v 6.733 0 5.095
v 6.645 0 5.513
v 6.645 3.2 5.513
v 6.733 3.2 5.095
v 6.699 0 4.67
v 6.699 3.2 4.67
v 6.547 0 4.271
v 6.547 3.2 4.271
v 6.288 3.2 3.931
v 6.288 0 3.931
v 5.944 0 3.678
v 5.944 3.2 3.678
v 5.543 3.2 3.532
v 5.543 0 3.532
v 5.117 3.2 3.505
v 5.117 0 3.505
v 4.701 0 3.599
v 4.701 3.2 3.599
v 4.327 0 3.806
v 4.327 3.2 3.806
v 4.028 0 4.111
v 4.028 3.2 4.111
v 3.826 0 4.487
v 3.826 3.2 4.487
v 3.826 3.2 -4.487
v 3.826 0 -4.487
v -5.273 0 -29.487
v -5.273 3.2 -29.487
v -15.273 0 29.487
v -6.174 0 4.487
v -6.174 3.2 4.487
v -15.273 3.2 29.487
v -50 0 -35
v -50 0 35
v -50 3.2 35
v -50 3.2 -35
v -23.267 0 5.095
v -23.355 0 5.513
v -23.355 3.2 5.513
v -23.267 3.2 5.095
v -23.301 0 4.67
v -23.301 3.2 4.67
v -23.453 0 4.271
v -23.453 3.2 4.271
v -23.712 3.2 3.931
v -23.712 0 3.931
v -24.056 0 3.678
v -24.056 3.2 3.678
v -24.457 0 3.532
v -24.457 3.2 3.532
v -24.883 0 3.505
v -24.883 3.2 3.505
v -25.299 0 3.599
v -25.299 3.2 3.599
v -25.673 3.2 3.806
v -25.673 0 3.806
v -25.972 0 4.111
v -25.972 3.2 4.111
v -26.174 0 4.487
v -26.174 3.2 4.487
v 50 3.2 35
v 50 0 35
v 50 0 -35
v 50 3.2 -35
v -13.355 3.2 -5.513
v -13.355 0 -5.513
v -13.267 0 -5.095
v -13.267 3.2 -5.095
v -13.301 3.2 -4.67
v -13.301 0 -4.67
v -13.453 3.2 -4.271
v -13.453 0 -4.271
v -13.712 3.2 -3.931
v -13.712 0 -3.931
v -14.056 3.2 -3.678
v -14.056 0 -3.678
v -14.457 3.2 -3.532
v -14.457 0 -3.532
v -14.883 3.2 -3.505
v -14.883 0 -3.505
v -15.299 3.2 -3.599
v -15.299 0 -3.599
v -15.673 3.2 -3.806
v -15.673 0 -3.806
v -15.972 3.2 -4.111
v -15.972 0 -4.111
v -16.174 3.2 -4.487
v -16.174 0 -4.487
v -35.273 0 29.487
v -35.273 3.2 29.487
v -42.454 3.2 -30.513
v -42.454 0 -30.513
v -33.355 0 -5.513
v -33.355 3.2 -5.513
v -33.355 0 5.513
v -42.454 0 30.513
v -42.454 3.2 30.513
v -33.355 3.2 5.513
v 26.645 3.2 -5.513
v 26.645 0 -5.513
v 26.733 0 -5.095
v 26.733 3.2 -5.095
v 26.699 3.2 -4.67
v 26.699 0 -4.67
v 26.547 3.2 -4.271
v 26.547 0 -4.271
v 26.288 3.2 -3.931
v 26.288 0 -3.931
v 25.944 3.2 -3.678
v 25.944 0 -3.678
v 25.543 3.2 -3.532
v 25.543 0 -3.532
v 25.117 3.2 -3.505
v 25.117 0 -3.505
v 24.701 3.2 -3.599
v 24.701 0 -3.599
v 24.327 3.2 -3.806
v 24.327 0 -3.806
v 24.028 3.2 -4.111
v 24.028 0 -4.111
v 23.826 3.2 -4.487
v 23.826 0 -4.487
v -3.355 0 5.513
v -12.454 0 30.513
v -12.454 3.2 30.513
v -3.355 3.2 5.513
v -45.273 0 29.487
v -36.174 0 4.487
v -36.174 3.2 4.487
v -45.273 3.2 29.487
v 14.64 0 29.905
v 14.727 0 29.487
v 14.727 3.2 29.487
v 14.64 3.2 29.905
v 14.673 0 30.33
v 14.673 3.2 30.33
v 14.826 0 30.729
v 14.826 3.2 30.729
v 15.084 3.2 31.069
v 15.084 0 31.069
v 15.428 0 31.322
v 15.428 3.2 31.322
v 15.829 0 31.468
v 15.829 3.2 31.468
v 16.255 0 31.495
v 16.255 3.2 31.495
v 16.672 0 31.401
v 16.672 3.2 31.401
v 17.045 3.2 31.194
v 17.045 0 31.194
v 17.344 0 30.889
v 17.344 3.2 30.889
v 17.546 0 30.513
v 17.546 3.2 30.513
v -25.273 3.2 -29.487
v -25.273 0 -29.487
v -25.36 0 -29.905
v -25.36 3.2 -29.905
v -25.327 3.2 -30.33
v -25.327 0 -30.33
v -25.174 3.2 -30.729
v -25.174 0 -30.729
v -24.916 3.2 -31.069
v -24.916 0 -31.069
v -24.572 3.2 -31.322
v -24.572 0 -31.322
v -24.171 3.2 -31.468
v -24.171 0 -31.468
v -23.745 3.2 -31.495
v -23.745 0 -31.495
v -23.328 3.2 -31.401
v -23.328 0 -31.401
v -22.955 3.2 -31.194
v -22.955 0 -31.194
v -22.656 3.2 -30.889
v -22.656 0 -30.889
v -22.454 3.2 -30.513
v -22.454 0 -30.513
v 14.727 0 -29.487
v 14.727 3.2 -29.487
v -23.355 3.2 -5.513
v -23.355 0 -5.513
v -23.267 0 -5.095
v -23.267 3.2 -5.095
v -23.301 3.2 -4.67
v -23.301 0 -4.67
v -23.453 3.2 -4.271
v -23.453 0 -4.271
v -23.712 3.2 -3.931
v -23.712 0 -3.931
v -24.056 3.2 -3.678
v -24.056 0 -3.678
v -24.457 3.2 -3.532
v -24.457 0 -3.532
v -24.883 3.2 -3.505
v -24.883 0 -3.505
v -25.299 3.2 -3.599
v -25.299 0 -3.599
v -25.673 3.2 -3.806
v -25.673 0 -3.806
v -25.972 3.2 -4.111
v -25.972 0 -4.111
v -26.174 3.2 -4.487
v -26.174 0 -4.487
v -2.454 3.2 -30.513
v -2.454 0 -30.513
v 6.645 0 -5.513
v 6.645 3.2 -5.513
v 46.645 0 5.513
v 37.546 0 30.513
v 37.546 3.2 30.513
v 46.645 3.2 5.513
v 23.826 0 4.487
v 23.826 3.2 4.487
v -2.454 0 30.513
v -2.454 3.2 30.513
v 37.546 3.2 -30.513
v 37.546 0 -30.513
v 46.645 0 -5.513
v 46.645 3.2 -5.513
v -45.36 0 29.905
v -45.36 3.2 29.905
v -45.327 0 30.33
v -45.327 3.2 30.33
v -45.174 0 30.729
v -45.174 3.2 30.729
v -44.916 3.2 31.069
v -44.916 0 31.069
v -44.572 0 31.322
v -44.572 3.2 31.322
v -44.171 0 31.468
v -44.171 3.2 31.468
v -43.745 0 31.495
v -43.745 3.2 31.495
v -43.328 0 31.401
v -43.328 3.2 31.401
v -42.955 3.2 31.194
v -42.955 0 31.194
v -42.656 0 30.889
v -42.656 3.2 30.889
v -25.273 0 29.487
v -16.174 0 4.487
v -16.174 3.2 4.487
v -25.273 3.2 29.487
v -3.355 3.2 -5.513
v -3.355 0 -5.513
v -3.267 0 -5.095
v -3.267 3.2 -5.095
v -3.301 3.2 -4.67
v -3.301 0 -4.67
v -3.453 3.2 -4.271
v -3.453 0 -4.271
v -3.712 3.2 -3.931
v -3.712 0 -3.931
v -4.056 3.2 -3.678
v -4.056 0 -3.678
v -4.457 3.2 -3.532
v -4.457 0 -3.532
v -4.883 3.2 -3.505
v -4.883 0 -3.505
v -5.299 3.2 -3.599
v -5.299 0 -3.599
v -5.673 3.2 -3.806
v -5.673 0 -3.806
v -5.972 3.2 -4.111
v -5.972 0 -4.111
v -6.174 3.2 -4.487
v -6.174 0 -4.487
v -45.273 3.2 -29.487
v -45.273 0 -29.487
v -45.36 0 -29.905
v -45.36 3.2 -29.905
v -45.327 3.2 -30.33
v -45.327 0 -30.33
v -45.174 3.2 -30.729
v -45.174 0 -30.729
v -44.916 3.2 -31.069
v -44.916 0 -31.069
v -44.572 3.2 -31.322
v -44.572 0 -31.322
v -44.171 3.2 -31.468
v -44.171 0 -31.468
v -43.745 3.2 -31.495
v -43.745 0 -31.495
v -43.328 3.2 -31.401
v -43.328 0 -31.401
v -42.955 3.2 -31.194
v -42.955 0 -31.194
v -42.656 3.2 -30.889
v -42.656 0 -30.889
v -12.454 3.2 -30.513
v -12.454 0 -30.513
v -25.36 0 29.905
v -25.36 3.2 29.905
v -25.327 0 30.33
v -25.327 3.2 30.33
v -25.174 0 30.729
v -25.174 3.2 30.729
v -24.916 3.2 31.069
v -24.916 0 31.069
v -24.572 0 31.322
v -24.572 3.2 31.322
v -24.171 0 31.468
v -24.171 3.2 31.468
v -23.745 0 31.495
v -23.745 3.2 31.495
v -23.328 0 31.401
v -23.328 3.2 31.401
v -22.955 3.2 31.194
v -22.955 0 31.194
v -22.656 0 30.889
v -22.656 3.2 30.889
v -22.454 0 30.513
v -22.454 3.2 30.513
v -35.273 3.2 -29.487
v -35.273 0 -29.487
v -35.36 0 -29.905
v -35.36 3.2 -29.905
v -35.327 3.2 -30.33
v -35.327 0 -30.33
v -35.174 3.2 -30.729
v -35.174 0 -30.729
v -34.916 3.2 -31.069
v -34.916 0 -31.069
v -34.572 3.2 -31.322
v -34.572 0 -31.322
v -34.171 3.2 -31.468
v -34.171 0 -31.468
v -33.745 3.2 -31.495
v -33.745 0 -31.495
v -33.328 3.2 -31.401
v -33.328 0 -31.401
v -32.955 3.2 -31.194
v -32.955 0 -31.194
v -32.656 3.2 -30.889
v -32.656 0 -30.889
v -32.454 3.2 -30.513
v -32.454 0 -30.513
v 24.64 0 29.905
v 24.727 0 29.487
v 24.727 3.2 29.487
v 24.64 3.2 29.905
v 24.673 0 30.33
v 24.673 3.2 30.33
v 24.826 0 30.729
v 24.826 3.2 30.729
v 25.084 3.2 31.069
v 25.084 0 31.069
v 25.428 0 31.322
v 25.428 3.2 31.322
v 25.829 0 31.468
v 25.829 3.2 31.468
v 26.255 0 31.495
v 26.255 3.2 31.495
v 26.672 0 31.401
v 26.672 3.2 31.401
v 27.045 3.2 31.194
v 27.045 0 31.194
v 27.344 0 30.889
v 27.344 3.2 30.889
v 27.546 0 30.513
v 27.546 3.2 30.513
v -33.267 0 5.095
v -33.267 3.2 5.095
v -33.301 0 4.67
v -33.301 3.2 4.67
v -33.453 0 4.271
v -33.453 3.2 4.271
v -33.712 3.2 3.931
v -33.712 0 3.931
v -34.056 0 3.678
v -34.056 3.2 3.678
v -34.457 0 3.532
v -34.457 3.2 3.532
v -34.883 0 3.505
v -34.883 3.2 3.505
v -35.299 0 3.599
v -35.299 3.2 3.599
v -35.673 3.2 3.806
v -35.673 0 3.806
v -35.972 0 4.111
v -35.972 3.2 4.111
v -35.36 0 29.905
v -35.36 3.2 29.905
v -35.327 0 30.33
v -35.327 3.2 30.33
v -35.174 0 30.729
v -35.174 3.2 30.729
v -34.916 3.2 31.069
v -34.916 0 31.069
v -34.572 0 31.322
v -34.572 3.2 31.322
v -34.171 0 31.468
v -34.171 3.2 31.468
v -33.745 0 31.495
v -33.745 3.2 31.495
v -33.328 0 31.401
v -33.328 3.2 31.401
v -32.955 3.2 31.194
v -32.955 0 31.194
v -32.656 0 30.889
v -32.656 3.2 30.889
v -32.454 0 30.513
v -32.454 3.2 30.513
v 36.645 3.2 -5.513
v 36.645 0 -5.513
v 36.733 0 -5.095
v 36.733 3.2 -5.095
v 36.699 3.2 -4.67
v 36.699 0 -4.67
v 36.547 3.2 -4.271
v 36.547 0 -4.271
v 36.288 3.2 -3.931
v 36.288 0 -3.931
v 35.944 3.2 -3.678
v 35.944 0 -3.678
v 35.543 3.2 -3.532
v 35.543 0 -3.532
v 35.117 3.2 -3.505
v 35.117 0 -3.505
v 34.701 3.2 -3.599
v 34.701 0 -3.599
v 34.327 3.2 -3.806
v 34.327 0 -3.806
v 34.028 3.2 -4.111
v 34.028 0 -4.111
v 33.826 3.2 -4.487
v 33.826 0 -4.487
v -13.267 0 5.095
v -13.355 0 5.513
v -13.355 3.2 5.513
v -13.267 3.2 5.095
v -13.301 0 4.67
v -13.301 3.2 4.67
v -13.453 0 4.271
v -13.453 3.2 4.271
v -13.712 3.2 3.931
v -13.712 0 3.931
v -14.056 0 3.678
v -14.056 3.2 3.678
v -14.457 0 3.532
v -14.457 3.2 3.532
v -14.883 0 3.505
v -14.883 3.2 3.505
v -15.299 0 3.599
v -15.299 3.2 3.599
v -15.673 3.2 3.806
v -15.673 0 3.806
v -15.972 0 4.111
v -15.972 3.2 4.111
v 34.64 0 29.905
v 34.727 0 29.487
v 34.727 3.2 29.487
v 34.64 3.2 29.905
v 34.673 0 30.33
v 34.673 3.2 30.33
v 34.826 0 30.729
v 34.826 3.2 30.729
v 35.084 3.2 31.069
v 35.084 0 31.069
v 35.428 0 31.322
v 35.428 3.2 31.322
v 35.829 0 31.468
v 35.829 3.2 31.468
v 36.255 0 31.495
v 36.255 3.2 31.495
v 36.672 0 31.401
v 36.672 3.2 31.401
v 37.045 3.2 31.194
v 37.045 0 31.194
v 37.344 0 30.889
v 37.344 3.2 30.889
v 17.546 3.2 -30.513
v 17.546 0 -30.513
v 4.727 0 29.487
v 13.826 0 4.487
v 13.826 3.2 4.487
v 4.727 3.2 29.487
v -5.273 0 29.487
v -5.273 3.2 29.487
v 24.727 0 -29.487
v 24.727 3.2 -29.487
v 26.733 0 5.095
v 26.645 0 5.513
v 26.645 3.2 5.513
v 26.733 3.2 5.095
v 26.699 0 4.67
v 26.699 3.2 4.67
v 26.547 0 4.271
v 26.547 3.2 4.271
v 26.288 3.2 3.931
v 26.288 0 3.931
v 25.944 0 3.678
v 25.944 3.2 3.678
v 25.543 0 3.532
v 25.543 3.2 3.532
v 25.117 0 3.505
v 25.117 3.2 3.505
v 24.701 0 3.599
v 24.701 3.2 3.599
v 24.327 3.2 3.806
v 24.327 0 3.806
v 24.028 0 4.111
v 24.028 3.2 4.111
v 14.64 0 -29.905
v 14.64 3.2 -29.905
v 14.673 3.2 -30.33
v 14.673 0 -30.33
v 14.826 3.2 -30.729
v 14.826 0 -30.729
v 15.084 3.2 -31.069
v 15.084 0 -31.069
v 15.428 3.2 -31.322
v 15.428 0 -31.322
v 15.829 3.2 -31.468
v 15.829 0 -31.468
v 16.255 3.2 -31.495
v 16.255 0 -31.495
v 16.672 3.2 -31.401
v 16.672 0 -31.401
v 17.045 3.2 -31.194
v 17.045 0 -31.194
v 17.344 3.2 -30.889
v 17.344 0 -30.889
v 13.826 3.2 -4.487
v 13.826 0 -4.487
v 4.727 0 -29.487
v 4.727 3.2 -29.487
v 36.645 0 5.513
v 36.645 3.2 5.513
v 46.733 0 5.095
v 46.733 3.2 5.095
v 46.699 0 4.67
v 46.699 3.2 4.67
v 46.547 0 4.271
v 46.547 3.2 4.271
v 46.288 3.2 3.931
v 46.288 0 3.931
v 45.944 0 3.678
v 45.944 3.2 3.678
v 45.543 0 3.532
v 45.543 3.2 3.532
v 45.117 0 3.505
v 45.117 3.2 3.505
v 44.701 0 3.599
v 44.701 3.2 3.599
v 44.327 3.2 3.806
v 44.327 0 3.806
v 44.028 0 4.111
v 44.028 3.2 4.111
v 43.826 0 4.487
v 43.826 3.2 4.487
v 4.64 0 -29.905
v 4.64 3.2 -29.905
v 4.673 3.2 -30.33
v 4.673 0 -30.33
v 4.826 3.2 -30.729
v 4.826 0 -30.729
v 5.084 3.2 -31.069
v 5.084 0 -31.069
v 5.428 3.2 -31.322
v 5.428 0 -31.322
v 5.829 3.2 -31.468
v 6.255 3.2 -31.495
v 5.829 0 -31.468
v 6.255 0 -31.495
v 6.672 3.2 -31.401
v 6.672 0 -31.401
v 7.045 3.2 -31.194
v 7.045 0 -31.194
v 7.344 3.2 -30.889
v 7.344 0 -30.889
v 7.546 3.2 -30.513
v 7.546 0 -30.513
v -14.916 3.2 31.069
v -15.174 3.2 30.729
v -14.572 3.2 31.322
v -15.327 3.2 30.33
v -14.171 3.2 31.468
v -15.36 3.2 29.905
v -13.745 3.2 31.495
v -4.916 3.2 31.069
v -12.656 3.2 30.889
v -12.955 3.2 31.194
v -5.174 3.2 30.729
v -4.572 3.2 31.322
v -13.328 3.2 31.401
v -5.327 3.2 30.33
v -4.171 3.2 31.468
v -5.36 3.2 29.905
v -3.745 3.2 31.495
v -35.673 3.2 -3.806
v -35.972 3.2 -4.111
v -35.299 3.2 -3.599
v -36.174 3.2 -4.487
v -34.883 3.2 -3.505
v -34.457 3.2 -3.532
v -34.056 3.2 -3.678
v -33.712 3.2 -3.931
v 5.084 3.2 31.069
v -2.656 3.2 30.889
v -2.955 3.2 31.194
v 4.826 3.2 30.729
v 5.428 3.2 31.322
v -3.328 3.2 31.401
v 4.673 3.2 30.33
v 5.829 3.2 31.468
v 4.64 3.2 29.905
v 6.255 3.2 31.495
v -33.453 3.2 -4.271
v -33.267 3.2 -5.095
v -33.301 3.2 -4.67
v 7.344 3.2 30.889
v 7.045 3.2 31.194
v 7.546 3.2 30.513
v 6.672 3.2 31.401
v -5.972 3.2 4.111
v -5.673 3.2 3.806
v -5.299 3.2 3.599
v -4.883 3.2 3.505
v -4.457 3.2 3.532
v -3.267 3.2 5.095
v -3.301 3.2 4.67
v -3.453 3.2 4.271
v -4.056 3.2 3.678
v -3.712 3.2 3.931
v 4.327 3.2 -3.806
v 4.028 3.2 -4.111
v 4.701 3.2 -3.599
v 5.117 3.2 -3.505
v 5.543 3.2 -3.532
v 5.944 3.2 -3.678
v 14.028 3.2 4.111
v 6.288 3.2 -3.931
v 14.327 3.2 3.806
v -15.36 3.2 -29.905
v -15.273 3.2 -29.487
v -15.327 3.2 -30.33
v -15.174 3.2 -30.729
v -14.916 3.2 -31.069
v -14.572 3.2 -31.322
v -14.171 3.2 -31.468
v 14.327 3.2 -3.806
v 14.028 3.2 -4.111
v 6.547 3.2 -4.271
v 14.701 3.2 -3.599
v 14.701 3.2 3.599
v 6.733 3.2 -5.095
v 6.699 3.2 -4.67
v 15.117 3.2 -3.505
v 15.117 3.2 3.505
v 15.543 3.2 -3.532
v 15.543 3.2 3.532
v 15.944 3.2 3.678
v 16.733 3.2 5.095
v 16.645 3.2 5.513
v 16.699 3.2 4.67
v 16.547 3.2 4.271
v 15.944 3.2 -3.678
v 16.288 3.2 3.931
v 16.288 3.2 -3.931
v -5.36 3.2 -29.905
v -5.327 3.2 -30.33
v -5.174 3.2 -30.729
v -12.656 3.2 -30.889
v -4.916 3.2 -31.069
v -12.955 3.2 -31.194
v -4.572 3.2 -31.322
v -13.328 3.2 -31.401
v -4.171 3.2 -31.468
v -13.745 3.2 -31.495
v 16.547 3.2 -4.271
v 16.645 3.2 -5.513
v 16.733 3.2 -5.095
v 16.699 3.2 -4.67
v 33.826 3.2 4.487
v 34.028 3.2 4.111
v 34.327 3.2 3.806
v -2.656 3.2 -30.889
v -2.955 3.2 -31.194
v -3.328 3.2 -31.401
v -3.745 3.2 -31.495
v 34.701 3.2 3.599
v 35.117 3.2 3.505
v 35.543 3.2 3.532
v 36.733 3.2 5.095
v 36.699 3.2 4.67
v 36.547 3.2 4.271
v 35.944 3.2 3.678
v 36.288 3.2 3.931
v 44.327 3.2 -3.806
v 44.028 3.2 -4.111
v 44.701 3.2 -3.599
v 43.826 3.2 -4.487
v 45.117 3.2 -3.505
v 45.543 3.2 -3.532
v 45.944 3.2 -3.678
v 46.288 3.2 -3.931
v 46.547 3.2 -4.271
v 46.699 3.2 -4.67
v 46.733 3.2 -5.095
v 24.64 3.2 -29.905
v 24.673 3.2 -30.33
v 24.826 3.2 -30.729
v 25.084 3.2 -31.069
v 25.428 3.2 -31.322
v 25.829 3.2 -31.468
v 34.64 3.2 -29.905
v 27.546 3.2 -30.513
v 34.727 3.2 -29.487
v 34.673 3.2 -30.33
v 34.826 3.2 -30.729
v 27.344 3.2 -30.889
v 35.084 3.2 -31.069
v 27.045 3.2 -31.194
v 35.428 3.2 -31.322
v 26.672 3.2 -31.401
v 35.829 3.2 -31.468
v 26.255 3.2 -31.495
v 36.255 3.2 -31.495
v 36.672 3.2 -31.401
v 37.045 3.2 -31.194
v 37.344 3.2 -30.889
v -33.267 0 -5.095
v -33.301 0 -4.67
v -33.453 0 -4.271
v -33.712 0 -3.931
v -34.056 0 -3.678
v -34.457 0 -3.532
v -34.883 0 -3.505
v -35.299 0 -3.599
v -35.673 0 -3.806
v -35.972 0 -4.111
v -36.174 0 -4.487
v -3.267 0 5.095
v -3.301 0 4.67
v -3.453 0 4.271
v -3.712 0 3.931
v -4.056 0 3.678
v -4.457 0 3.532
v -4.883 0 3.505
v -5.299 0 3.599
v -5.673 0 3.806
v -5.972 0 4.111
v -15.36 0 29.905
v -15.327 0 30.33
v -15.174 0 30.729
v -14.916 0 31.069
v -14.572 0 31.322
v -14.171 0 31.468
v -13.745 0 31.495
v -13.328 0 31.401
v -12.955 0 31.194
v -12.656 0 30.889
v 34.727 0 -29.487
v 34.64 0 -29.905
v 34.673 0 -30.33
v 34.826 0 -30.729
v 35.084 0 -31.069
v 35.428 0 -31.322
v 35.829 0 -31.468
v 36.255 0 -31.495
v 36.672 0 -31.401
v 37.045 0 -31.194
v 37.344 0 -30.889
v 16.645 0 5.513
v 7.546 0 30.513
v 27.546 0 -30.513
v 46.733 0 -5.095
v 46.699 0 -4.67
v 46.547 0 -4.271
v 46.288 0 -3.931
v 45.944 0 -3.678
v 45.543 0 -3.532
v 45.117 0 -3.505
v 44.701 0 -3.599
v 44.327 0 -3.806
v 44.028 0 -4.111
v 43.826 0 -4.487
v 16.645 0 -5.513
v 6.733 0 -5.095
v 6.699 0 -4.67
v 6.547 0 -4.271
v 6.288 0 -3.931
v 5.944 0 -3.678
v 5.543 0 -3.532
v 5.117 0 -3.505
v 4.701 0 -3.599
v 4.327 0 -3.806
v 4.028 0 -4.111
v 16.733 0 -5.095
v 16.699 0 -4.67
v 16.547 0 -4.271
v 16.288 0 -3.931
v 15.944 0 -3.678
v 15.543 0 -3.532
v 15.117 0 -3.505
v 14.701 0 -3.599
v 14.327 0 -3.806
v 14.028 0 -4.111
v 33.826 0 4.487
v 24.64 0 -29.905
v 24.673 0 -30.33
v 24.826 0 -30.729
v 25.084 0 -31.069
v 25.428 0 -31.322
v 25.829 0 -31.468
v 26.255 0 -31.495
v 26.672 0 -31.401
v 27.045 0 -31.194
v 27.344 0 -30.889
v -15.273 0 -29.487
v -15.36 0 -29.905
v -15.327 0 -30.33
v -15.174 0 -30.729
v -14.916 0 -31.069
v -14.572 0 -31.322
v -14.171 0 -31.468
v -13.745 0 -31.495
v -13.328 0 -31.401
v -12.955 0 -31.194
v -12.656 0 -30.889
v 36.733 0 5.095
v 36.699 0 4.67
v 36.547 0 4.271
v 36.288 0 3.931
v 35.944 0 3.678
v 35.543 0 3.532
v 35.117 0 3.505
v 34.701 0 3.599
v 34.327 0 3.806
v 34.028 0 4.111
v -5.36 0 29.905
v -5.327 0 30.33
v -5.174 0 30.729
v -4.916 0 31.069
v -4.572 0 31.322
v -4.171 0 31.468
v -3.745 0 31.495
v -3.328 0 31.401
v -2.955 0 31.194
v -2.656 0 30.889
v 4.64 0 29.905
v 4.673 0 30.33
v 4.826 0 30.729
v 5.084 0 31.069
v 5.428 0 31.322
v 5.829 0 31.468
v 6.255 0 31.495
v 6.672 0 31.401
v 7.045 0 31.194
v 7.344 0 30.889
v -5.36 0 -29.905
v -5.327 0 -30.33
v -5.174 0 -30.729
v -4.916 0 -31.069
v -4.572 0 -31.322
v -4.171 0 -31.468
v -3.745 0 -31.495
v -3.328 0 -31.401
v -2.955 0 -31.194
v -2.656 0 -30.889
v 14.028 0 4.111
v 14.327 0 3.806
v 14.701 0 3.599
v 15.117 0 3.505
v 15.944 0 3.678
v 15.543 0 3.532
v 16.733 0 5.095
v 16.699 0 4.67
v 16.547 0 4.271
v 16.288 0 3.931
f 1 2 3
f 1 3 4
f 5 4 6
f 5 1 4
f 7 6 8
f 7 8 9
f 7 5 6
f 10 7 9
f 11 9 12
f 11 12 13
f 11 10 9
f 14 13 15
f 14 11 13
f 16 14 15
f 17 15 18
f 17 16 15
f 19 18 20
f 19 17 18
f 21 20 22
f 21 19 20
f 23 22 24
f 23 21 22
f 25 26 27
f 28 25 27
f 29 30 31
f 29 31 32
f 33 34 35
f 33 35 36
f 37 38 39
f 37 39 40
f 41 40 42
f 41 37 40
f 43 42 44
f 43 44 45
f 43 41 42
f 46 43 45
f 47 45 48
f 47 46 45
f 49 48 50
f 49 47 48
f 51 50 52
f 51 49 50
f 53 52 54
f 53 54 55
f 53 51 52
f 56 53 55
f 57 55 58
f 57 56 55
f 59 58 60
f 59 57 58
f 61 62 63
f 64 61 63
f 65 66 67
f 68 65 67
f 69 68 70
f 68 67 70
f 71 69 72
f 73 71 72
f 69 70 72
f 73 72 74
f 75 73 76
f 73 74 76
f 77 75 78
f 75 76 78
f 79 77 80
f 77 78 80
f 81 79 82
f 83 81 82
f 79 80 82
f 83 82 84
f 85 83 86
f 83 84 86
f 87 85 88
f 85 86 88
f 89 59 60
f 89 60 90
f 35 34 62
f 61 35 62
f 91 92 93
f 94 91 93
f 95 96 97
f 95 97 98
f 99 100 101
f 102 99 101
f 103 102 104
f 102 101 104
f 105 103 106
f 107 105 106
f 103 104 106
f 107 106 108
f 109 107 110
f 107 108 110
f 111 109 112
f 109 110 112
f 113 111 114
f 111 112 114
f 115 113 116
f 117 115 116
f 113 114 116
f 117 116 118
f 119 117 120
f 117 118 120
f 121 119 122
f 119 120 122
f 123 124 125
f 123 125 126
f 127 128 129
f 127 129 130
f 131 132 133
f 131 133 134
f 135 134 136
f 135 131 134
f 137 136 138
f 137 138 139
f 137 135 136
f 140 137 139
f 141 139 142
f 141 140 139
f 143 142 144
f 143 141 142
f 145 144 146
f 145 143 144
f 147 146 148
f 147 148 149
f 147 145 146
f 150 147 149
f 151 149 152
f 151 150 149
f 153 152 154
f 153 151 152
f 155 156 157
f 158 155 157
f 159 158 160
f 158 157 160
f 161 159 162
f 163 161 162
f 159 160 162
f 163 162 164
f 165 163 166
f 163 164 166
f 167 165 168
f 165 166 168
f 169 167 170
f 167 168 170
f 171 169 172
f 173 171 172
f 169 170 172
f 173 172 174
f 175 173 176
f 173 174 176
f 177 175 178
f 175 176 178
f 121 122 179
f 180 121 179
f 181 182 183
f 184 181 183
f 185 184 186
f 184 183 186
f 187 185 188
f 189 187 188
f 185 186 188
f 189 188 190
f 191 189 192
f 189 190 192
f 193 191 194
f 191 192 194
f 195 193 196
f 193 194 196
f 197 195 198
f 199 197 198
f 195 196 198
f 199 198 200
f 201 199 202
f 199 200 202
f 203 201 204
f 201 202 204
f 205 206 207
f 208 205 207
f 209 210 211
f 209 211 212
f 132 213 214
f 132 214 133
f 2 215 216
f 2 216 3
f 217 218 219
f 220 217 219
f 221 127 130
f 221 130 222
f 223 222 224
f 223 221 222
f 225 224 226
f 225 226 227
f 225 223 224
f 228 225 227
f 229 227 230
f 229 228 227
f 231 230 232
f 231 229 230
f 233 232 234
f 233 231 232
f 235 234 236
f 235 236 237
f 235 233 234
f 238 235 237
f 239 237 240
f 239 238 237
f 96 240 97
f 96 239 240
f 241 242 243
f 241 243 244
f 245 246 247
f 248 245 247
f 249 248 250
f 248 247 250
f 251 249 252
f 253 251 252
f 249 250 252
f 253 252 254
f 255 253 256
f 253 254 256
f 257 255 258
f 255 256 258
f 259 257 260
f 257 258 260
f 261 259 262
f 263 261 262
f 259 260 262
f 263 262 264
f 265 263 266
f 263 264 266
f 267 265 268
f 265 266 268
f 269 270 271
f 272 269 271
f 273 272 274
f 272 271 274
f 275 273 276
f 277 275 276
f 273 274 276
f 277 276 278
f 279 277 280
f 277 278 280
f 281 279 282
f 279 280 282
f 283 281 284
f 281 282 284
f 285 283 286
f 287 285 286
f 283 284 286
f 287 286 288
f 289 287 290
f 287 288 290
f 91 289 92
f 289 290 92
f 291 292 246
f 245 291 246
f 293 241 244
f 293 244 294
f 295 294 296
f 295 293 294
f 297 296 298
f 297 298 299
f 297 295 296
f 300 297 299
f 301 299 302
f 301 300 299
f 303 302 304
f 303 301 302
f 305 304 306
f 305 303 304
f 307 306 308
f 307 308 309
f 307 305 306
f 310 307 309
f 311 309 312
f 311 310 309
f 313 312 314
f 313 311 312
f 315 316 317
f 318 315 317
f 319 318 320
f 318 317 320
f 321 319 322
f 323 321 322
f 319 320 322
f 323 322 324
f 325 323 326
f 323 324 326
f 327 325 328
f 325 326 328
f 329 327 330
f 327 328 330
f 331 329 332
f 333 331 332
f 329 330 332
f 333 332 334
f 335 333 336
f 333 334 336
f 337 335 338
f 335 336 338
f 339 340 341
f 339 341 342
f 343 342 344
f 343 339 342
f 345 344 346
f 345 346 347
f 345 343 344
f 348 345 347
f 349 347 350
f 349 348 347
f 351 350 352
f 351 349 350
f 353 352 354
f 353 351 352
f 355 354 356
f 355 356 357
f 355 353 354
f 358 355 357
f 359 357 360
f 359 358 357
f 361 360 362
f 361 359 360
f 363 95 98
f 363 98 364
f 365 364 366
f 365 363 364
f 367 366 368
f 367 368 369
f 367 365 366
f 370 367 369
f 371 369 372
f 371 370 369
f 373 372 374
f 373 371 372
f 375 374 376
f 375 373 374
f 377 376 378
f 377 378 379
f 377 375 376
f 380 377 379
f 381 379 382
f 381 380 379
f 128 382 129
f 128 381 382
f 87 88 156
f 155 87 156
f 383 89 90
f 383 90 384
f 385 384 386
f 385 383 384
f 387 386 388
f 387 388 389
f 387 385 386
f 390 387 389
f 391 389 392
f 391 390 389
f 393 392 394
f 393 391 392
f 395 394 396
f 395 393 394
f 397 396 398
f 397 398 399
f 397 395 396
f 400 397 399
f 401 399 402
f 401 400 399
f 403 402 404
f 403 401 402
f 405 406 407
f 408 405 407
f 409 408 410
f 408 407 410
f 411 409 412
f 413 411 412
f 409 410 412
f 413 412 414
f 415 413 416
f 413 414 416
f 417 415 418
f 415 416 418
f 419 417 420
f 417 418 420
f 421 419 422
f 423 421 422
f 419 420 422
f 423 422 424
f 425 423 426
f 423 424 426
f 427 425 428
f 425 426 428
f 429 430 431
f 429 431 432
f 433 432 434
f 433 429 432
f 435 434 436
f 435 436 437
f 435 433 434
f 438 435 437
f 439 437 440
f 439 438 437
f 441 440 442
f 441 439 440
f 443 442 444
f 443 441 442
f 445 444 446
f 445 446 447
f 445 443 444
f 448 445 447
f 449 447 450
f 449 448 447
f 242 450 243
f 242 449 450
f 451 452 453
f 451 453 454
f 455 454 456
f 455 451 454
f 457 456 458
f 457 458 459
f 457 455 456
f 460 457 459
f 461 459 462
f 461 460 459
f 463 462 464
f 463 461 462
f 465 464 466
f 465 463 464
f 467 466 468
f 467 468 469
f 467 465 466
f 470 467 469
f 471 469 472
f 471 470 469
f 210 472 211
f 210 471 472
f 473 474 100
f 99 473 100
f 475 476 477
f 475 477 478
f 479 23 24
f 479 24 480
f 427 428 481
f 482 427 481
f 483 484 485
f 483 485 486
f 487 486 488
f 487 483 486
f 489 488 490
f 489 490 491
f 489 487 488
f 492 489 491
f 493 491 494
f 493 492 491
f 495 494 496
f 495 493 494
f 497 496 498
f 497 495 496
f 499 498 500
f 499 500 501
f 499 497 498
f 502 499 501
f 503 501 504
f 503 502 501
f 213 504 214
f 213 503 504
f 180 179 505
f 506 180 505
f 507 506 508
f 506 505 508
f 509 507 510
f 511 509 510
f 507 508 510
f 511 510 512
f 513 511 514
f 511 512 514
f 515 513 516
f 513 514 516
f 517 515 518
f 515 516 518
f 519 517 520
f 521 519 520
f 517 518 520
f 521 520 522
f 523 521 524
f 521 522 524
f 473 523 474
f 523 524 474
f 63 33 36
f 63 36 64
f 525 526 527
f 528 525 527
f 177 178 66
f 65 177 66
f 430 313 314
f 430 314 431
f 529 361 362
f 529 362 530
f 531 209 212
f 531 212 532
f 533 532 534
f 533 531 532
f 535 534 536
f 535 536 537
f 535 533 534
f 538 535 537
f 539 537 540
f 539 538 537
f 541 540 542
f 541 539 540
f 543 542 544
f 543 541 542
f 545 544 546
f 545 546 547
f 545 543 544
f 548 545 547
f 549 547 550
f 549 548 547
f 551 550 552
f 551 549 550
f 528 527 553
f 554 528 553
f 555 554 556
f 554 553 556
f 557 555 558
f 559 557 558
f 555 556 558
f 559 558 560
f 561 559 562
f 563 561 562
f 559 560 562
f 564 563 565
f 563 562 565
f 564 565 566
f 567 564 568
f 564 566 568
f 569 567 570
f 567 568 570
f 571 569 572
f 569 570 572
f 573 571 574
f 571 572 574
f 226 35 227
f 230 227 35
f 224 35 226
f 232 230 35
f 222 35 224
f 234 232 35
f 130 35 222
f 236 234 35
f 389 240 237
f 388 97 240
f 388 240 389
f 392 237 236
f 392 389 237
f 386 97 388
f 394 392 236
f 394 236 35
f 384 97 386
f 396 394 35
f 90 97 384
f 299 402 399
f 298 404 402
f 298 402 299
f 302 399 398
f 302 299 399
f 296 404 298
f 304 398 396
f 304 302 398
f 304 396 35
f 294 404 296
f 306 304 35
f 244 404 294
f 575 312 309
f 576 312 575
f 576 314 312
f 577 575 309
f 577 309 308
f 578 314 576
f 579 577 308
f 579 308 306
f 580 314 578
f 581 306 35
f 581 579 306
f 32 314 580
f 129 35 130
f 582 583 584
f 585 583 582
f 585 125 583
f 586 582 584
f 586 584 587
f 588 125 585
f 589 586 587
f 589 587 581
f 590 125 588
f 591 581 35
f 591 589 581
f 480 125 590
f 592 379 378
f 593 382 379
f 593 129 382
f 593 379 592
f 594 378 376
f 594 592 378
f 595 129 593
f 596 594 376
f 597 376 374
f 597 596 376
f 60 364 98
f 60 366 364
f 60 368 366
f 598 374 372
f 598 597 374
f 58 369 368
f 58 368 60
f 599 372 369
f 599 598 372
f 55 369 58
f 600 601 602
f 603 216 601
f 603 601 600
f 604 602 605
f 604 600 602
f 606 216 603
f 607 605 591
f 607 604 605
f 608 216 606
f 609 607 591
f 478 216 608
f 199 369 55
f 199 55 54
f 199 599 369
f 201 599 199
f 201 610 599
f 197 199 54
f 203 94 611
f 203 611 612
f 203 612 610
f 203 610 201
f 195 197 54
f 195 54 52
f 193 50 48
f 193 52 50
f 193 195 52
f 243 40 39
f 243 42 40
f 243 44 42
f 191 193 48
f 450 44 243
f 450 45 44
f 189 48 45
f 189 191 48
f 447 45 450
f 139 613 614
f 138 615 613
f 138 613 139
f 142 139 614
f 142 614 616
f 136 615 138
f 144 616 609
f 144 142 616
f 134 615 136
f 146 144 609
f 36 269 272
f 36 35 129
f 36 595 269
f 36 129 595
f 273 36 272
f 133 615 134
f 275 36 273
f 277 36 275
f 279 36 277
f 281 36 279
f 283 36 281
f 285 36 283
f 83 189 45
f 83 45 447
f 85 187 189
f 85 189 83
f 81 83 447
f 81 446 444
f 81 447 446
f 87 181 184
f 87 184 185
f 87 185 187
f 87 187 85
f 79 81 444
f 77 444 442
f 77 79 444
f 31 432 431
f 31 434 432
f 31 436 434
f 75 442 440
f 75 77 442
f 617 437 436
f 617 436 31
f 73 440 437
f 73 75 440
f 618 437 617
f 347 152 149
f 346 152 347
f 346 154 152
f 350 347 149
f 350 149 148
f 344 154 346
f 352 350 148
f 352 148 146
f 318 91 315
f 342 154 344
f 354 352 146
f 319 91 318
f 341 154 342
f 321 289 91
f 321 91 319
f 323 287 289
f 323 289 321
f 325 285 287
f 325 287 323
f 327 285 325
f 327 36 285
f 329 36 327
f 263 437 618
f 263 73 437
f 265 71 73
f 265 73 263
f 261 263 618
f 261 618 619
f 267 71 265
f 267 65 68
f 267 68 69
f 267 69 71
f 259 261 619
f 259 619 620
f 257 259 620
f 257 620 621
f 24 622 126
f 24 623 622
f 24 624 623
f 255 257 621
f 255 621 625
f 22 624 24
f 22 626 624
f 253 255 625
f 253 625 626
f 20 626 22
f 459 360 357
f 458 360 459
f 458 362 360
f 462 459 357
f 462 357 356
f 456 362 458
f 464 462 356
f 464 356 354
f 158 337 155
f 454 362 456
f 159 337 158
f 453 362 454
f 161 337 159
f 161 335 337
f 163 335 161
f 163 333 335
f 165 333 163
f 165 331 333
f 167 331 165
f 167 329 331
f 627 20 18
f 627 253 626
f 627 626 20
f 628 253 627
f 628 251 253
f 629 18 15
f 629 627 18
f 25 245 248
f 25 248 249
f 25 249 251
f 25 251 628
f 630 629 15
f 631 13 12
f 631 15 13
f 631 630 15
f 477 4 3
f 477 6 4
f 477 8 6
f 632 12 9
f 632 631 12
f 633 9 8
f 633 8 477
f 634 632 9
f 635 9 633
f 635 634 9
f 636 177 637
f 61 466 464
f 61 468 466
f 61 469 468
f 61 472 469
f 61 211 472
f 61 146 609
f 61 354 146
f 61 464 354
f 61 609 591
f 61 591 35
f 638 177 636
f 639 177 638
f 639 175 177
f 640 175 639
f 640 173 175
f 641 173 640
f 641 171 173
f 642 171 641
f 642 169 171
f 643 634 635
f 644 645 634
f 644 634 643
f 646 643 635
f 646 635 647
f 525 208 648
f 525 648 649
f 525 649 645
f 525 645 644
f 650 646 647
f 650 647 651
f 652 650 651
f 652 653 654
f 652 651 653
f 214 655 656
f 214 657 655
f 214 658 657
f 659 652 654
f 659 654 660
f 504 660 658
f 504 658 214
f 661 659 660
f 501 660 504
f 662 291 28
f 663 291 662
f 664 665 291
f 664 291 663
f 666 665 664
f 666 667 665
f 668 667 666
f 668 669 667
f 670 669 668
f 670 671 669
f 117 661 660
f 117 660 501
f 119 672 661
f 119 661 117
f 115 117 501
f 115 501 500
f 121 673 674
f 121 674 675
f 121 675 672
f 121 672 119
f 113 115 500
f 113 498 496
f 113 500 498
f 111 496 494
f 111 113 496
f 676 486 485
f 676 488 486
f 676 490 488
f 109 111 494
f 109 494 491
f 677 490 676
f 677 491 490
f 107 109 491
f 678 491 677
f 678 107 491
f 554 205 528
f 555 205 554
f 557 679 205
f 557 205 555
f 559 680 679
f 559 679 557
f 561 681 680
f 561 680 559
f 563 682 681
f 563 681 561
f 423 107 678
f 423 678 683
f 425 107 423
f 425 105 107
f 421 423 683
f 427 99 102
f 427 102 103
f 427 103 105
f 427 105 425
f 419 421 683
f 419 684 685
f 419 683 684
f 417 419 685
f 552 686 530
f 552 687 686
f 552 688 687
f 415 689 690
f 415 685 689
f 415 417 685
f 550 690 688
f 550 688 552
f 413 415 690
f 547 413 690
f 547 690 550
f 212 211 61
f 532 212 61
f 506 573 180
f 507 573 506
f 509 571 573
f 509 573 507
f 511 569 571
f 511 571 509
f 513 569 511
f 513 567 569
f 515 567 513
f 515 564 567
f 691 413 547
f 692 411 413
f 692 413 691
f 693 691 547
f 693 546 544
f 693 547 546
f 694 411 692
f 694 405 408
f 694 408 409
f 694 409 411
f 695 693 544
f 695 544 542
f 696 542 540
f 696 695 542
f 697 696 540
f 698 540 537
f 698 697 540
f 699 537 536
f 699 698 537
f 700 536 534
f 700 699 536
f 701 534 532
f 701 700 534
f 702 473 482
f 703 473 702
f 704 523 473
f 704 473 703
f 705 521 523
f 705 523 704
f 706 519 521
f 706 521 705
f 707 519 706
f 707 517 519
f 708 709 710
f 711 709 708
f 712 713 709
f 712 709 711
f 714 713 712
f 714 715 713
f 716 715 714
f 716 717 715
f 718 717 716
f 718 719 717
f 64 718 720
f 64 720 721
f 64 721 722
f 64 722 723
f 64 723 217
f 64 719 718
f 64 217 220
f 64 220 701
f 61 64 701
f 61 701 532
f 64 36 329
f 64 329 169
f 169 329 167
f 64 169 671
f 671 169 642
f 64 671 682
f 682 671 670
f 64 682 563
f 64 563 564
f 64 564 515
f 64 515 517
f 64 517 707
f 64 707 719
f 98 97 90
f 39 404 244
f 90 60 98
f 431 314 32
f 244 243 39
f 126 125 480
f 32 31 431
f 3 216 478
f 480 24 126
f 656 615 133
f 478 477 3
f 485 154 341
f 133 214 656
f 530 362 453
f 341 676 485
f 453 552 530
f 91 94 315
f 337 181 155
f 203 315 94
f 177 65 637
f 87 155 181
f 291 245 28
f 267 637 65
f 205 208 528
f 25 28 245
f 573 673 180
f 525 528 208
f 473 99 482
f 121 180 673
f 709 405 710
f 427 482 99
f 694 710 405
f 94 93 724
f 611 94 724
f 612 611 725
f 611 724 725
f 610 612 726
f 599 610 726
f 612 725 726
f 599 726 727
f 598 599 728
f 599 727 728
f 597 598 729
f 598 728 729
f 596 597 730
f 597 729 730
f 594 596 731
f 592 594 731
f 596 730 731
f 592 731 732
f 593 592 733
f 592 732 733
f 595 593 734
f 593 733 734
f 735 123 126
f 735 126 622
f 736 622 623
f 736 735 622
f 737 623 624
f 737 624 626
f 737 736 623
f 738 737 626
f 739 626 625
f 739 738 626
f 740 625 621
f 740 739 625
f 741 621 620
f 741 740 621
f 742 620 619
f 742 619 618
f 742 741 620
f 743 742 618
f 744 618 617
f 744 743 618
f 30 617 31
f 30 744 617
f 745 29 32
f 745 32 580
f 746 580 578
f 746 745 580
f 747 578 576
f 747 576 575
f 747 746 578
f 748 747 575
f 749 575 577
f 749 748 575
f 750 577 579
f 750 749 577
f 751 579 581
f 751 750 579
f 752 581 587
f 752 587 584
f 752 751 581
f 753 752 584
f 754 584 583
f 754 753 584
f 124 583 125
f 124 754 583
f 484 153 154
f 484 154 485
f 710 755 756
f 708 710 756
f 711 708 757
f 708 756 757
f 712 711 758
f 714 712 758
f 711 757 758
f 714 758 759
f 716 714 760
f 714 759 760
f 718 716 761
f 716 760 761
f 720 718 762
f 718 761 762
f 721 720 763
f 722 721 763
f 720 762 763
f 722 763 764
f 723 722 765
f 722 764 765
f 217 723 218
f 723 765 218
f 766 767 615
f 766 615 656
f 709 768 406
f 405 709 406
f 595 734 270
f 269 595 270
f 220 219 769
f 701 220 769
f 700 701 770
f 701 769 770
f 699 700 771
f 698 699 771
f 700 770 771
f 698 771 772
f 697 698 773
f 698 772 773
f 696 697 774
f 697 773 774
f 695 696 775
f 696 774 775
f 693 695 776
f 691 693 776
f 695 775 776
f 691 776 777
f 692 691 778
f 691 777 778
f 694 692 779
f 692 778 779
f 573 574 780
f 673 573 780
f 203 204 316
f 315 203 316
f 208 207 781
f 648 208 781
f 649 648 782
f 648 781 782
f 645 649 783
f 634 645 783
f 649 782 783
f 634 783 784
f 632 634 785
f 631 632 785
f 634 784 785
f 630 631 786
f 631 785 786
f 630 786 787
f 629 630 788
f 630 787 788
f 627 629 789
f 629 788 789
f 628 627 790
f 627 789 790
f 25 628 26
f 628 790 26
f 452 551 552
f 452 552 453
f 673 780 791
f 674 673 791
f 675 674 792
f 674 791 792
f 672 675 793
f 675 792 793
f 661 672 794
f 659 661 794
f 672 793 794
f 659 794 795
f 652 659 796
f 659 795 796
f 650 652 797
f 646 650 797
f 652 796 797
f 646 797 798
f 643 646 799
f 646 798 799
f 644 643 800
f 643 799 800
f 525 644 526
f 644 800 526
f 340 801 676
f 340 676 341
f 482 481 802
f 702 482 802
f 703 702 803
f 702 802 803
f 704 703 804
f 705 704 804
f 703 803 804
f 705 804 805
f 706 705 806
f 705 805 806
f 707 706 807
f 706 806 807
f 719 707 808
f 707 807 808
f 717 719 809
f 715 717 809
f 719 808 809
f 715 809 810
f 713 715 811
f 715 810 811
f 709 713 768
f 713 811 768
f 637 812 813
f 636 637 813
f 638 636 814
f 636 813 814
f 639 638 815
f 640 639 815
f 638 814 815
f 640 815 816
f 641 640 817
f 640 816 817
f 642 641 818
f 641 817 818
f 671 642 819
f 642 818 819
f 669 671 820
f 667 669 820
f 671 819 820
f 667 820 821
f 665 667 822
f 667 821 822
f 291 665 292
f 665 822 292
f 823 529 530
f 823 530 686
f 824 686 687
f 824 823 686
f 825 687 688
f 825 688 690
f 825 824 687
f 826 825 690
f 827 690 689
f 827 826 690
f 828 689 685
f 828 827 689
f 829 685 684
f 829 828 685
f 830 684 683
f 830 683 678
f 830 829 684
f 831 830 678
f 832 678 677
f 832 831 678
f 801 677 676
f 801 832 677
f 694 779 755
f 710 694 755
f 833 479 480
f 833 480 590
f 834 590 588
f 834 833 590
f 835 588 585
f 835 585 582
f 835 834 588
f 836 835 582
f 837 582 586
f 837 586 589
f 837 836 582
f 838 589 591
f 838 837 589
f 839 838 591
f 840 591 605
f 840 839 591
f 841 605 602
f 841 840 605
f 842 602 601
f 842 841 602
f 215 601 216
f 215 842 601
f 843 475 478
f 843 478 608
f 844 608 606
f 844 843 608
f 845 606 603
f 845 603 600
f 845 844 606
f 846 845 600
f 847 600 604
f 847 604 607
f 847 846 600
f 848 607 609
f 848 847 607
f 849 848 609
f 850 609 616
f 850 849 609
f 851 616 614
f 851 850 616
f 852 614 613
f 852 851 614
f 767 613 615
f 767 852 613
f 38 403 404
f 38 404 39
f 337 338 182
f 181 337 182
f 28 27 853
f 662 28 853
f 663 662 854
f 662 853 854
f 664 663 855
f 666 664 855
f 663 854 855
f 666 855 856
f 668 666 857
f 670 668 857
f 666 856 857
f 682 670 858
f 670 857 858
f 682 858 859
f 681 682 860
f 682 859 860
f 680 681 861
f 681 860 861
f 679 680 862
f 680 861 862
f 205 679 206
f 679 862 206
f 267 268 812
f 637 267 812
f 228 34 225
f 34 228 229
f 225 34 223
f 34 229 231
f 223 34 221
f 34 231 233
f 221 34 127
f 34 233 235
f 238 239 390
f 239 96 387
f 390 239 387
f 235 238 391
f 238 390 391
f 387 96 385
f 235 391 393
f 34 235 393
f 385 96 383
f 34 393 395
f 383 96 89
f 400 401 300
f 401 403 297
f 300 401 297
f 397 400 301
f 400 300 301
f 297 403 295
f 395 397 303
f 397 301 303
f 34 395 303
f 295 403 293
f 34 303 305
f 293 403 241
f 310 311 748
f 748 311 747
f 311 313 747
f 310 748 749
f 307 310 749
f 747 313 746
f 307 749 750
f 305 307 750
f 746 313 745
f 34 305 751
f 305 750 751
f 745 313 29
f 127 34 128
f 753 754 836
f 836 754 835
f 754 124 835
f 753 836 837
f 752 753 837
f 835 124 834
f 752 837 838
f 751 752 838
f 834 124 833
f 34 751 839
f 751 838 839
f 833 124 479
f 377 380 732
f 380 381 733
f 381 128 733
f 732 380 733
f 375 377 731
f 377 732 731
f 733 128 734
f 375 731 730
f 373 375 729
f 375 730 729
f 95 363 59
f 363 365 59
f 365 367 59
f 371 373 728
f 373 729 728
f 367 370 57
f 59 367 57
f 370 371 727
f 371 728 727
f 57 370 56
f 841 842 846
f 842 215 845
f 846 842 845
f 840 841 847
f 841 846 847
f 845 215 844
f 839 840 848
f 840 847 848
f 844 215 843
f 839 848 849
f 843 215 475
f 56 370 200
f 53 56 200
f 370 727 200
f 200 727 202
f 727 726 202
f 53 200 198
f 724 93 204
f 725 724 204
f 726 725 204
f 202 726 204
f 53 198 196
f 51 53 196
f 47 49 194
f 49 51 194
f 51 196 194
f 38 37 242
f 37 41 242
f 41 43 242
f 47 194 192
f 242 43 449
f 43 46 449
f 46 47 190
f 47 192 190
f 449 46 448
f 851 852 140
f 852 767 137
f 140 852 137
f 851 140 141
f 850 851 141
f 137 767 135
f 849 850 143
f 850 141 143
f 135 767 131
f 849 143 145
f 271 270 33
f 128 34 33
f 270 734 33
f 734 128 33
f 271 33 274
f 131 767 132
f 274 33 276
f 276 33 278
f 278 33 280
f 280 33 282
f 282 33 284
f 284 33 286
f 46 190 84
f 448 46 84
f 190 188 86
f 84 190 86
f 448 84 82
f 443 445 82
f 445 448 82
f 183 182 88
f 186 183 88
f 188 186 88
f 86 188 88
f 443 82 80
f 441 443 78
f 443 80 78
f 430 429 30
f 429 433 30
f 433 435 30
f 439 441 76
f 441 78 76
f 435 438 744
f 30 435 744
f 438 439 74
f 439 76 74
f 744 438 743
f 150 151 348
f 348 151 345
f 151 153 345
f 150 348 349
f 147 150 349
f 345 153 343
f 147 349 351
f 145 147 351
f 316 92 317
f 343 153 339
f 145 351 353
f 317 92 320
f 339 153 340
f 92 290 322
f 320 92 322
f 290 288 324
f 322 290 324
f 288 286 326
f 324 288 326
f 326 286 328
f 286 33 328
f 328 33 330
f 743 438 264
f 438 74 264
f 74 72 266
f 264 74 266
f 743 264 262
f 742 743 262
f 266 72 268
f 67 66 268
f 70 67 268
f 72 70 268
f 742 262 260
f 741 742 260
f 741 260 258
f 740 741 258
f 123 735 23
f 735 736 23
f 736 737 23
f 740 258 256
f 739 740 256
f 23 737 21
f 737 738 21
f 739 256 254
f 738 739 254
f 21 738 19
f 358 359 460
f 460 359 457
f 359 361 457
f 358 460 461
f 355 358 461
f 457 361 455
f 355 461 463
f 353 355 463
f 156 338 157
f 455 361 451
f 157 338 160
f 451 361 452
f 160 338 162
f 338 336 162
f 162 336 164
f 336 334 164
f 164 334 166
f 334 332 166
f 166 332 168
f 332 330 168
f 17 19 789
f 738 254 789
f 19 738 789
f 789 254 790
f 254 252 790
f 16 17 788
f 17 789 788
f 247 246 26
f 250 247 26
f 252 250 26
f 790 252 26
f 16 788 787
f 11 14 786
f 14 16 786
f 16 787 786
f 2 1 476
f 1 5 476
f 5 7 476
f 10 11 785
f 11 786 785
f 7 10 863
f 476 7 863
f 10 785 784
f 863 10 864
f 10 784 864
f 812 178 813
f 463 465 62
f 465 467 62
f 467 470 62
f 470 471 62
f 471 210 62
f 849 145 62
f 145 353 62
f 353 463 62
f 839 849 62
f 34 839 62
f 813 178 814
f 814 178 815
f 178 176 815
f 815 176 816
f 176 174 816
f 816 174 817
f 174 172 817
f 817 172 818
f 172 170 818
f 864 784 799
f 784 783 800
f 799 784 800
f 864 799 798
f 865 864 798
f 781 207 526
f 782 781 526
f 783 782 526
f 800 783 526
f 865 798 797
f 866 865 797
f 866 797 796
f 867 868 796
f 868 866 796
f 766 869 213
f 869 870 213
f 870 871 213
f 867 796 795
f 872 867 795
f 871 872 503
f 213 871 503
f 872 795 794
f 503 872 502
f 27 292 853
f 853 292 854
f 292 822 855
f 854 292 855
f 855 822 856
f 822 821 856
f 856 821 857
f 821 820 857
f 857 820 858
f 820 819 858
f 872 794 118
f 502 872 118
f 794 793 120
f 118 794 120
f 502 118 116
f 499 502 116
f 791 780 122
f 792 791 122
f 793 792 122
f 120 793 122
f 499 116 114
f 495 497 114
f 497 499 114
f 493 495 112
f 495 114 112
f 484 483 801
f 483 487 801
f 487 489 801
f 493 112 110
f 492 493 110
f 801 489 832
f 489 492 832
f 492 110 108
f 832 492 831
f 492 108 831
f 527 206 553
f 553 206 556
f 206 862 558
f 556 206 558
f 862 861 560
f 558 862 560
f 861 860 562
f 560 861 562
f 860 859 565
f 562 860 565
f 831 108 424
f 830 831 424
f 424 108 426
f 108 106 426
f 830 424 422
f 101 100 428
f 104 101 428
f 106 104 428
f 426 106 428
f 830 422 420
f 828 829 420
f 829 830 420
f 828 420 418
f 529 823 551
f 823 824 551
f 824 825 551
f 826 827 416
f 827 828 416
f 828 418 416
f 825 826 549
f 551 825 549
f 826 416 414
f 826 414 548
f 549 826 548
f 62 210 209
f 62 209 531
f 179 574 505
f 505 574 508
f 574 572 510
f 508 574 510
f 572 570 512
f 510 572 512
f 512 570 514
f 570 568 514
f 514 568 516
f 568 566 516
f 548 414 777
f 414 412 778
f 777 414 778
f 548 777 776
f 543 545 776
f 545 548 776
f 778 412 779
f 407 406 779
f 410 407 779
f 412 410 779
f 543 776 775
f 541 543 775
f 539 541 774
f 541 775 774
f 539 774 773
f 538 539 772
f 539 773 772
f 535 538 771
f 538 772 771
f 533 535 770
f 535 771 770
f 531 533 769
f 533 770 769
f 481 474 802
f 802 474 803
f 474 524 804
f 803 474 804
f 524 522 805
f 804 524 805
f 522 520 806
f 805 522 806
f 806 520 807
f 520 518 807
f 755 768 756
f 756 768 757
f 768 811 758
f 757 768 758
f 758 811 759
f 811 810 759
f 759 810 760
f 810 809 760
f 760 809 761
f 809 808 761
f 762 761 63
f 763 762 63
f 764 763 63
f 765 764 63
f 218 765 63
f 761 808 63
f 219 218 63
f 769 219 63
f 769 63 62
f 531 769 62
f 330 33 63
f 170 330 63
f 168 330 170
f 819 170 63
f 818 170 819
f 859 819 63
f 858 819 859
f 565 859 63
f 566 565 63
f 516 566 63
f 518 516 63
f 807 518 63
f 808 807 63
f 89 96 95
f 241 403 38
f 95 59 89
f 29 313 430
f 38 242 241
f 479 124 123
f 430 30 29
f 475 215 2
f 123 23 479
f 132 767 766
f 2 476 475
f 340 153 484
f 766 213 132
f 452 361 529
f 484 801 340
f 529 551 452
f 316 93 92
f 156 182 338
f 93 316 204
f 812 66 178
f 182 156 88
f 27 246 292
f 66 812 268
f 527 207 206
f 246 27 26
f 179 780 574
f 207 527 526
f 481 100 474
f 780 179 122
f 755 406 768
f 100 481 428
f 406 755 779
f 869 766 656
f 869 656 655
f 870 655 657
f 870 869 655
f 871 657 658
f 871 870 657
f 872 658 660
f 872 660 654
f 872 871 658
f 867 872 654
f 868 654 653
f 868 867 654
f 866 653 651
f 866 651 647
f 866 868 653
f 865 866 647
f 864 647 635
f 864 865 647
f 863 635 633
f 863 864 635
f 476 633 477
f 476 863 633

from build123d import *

# Parameters (mm, degrees)
SKETCH_1_W      = 100
SKETCH_1_H      = 70
EXTRUDE_1_DEPTH = 3.2


with BuildPart() as part:
    # Эскиз1 → Бобышка-Вытянуть1 (new body)
    with BuildSketch(Plane(origin=(0, 0, 0), x_dir=(1, 0, 0), z_dir=(0, 1, 0))):
        Rectangle(SKETCH_1_W, SKETCH_1_H)
        with BuildLine():
            Line((-42.453867058, 30.513030215), (-33.354611201, 5.513030215))
            ThreePointArc((-33.354611201, 5.513030215), (-34.251119917, 3.590461069), (-36.173689063, 4.486969785))
            Line((-36.173689063, 4.486969785), (-45.27294492, 29.486969785))
            ThreePointArc((-45.27294492, 29.486969785), (-44.376436204, 31.409538931), (-42.453867058, 30.513030215))
        make_face(mode=Mode.SUBTRACT)
        with BuildLine():
            Line((-32.453867058, 30.513030215), (-23.354611201, 5.513030215))
            ThreePointArc((-23.354611201, 5.513030215), (-24.251119917, 3.590461069), (-26.173689063, 4.486969785))
            Line((-26.173689063, 4.486969785), (-35.27294492, 29.486969785))
            ThreePointArc((-35.27294492, 29.486969785), (-34.376436204, 31.409538931), (-32.453867058, 30.513030215))
        make_face(mode=Mode.SUBTRACT)
        with BuildLine():
            Line((-22.453867058, 30.513030215), (-13.354611201, 5.513030215))
            ThreePointArc((-13.354611201, 5.513030215), (-14.251119917, 3.590461069), (-16.173689063, 4.486969785))
            Line((-16.173689063, 4.486969785), (-25.27294492, 29.486969785))
            ThreePointArc((-25.27294492, 29.486969785), (-24.376436204, 31.409538931), (-22.453867058, 30.513030215))
        make_face(mode=Mode.SUBTRACT)
        with BuildLine():
            Line((-12.453867058, 30.513030215), (-3.354611201, 5.513030215))
            ThreePointArc((-3.354611201, 5.513030215), (-4.251119917, 3.590461069), (-6.173689063, 4.486969785))
            Line((-6.173689063, 4.486969785), (-15.27294492, 29.486969785))
            ThreePointArc((-15.27294492, 29.486969785), (-14.376436204, 31.409538931), (-12.453867058, 30.513030215))
        make_face(mode=Mode.SUBTRACT)
        with BuildLine():
            Line((-2.453867058, 30.513030215), (6.645388799, 5.513030215))
            ThreePointArc((6.645388799, 5.513030215), (5.748880083, 3.590461069), (3.826310937, 4.486969785))
            Line((3.826310937, 4.486969785), (-5.27294492, 29.486969785))
            ThreePointArc((-5.27294492, 29.486969785), (-4.376436204, 31.409538931), (-2.453867058, 30.513030215))
        make_face(mode=Mode.SUBTRACT)
        with BuildLine():
            Line((7.546132942, 30.513030215), (16.645388799, 5.513030215))
            ThreePointArc((16.645388799, 5.513030215), (15.748880083, 3.590461069), (13.826310937, 4.486969785))
            Line((13.826310937, 4.486969785), (4.72705508, 29.486969785))
            ThreePointArc((4.72705508, 29.486969785), (5.623563796, 31.409538931), (7.546132942, 30.513030215))
        make_face(mode=Mode.SUBTRACT)
        with BuildLine():
            Line((17.546132942, 30.513030215), (26.645388799, 5.513030215))
            ThreePointArc((26.645388799, 5.513030215), (25.748880083, 3.590461069), (23.826310937, 4.486969785))
            Line((23.826310937, 4.486969785), (14.72705508, 29.486969785))
            ThreePointArc((14.72705508, 29.486969785), (15.623563796, 31.409538931), (17.546132942, 30.513030215))
        make_face(mode=Mode.SUBTRACT)
        with BuildLine():
            Line((27.546132942, 30.513030215), (36.645388799, 5.513030215))
            ThreePointArc((36.645388799, 5.513030215), (35.748880083, 3.590461069), (33.826310937, 4.486969785))
            Line((33.826310937, 4.486969785), (24.72705508, 29.486969785))
            ThreePointArc((24.72705508, 29.486969785), (25.623563796, 31.409538931), (27.546132942, 30.513030215))
        make_face(mode=Mode.SUBTRACT)
        with BuildLine():
            Line((37.546132942, 30.513030215), (46.645388799, 5.513030215))
            ThreePointArc((46.645388799, 5.513030215), (45.748880083, 3.590461069), (43.826310937, 4.486969785))
            Line((43.826310937, 4.486969785), (34.72705508, 29.486969785))
            ThreePointArc((34.72705508, 29.486969785), (35.623563796, 31.409538931), (37.546132942, 30.513030215))
        make_face(mode=Mode.SUBTRACT)
        with BuildLine():
            Line((-2.453867058, -30.513030215), (6.645388799, -5.513030215))
            ThreePointArc((6.645388799, -5.513030215), (5.748880083, -3.590461069), (3.826310937, -4.486969785))
            Line((3.826310937, -4.486969785), (-5.27294492, -29.486969785))
            ThreePointArc((-5.27294492, -29.486969785), (-4.376436204, -31.409538931), (-2.453867058, -30.513030215))
        make_face(mode=Mode.SUBTRACT)
        with BuildLine():
            Line((37.546132942, -30.513030215), (46.645388799, -5.513030215))
            ThreePointArc((46.645388799, -5.513030215), (45.748880083, -3.590461069), (43.826310937, -4.486969785))
            Line((43.826310937, -4.486969785), (34.72705508, -29.486969785))
            ThreePointArc((34.72705508, -29.486969785), (35.623563796, -31.409538931), (37.546132942, -30.513030215))
        make_face(mode=Mode.SUBTRACT)
        with BuildLine():
            Line((27.546132942, -30.513030215), (36.645388799, -5.513030215))
            ThreePointArc((36.645388799, -5.513030215), (35.748880083, -3.590461069), (33.826310937, -4.486969785))
            Line((33.826310937, -4.486969785), (24.72705508, -29.486969785))
            ThreePointArc((24.72705508, -29.486969785), (25.623563796, -31.409538931), (27.546132942, -30.513030215))
        make_face(mode=Mode.SUBTRACT)
        with BuildLine():
            Line((17.546132942, -30.513030215), (26.645388799, -5.513030215))
            ThreePointArc((26.645388799, -5.513030215), (25.748880083, -3.590461069), (23.826310937, -4.486969785))
            Line((23.826310937, -4.486969785), (14.72705508, -29.486969785))
            ThreePointArc((14.72705508, -29.486969785), (15.623563796, -31.409538931), (17.546132942, -30.513030215))
        make_face(mode=Mode.SUBTRACT)
        with BuildLine():
            Line((7.546132942, -30.513030215), (16.645388799, -5.513030215))
            ThreePointArc((16.645388799, -5.513030215), (15.748880083, -3.590461069), (13.826310937, -4.486969785))
            Line((13.826310937, -4.486969785), (4.72705508, -29.486969785))
            ThreePointArc((4.72705508, -29.486969785), (5.623563796, -31.409538931), (7.546132942, -30.513030215))
        make_face(mode=Mode.SUBTRACT)
        with BuildLine():
            Line((-12.453867058, -30.513030215), (-3.354611201, -5.513030215))
            ThreePointArc((-3.354611201, -5.513030215), (-4.251119917, -3.590461069), (-6.173689063, -4.486969785))
            Line((-6.173689063, -4.486969785), (-15.27294492, -29.486969785))
            ThreePointArc((-15.27294492, -29.486969785), (-14.376436204, -31.409538931), (-12.453867058, -30.513030215))
        make_face(mode=Mode.SUBTRACT)
        with BuildLine():
            Line((-22.453867058, -30.513030215), (-13.354611201, -5.513030215))
            ThreePointArc((-13.354611201, -5.513030215), (-14.251119917, -3.590461069), (-16.173689063, -4.486969785))
            Line((-16.173689063, -4.486969785), (-25.27294492, -29.486969785))
            ThreePointArc((-25.27294492, -29.486969785), (-24.376436204, -31.409538931), (-22.453867058, -30.513030215))
        make_face(mode=Mode.SUBTRACT)
        with BuildLine():
            Line((-32.453867058, -30.513030215), (-23.354611201, -5.513030215))
            ThreePointArc((-23.354611201, -5.513030215), (-24.251119917, -3.590461069), (-26.173689063, -4.486969785))
            Line((-26.173689063, -4.486969785), (-35.27294492, -29.486969785))
            ThreePointArc((-35.27294492, -29.486969785), (-34.376436204, -31.409538931), (-32.453867058, -30.513030215))
        make_face(mode=Mode.SUBTRACT)
        with BuildLine():
            Line((-42.453867058, -30.513030215), (-33.354611201, -5.513030215))
            ThreePointArc((-33.354611201, -5.513030215), (-34.251119917, -3.590461069), (-36.173689063, -4.486969785))
            Line((-36.173689063, -4.486969785), (-45.27294492, -29.486969785))
            ThreePointArc((-45.27294492, -29.486969785), (-44.376436204, -31.409538931), (-42.453867058, -30.513030215))
        make_face(mode=Mode.SUBTRACT)
    extrude(amount=EXTRUDE_1_DEPTH)


solid = part.part
